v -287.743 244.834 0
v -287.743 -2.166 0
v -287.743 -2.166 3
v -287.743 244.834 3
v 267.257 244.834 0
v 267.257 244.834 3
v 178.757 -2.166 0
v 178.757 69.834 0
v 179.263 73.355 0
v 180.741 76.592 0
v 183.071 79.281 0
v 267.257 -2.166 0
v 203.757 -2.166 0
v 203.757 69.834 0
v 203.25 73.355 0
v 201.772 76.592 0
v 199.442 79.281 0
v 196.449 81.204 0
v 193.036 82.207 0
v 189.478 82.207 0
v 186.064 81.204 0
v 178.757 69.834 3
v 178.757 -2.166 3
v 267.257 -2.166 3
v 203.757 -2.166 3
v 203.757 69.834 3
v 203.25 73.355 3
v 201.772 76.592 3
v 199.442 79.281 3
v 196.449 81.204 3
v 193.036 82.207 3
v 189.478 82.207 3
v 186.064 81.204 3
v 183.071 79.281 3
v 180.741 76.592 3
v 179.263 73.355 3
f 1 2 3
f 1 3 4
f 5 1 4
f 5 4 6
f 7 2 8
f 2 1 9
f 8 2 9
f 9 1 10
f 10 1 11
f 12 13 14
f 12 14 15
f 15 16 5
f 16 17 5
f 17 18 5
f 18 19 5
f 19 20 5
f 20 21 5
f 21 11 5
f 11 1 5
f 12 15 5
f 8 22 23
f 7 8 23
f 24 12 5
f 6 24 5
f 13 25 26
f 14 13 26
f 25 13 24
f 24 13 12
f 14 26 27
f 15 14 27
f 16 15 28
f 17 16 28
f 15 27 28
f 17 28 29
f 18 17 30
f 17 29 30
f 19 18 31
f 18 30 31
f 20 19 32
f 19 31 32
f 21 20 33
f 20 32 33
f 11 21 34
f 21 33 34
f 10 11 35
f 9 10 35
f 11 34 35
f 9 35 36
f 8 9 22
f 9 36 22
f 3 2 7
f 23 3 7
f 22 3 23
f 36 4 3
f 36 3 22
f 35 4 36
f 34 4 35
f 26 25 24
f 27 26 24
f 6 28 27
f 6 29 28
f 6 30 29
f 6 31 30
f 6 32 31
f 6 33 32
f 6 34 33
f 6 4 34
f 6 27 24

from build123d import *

# Parameters (mm, degrees)
ESQUISSE1_W             = 555
ESQUISSE1_H             = 247
BOSS_EXTRU_1_DEPTH      = 3
ENL_V_MAT_EXTRU_2_DEPTH = 72


with BuildPart() as part:
    # Esquisse1 → Boss.-Extru.1 (new body)
    with BuildSketch(Plane.XY):
        with Locations((-10.243311569, 121.33382636)):
            Rectangle(ESQUISSE1_W, ESQUISSE1_H)
    extrude(amount=BOSS_EXTRU_1_DEPTH)

    # Esquisse3 → Enlèv. mat.-Extru.2 (cut)
    with BuildSketch(Plane.XY.offset(3)):
        with BuildLine():
            Line((178.756688431, 69.83382636), (178.756688431, -2.16617364))
            Line((178.756688431, -2.16617364), (203.756688431, -2.16617364))
            Line((203.756688431, -2.16617364), (203.756688431, 69.83382636))
            ThreePointArc((203.756688431, 69.83382636), (191.256688431, 82.33382636), (178.756688431, 69.83382636))
        make_face()
    extrude(amount=-ENL_V_MAT_EXTRU_2_DEPTH, mode=Mode.SUBTRACT)


solid = part.part
